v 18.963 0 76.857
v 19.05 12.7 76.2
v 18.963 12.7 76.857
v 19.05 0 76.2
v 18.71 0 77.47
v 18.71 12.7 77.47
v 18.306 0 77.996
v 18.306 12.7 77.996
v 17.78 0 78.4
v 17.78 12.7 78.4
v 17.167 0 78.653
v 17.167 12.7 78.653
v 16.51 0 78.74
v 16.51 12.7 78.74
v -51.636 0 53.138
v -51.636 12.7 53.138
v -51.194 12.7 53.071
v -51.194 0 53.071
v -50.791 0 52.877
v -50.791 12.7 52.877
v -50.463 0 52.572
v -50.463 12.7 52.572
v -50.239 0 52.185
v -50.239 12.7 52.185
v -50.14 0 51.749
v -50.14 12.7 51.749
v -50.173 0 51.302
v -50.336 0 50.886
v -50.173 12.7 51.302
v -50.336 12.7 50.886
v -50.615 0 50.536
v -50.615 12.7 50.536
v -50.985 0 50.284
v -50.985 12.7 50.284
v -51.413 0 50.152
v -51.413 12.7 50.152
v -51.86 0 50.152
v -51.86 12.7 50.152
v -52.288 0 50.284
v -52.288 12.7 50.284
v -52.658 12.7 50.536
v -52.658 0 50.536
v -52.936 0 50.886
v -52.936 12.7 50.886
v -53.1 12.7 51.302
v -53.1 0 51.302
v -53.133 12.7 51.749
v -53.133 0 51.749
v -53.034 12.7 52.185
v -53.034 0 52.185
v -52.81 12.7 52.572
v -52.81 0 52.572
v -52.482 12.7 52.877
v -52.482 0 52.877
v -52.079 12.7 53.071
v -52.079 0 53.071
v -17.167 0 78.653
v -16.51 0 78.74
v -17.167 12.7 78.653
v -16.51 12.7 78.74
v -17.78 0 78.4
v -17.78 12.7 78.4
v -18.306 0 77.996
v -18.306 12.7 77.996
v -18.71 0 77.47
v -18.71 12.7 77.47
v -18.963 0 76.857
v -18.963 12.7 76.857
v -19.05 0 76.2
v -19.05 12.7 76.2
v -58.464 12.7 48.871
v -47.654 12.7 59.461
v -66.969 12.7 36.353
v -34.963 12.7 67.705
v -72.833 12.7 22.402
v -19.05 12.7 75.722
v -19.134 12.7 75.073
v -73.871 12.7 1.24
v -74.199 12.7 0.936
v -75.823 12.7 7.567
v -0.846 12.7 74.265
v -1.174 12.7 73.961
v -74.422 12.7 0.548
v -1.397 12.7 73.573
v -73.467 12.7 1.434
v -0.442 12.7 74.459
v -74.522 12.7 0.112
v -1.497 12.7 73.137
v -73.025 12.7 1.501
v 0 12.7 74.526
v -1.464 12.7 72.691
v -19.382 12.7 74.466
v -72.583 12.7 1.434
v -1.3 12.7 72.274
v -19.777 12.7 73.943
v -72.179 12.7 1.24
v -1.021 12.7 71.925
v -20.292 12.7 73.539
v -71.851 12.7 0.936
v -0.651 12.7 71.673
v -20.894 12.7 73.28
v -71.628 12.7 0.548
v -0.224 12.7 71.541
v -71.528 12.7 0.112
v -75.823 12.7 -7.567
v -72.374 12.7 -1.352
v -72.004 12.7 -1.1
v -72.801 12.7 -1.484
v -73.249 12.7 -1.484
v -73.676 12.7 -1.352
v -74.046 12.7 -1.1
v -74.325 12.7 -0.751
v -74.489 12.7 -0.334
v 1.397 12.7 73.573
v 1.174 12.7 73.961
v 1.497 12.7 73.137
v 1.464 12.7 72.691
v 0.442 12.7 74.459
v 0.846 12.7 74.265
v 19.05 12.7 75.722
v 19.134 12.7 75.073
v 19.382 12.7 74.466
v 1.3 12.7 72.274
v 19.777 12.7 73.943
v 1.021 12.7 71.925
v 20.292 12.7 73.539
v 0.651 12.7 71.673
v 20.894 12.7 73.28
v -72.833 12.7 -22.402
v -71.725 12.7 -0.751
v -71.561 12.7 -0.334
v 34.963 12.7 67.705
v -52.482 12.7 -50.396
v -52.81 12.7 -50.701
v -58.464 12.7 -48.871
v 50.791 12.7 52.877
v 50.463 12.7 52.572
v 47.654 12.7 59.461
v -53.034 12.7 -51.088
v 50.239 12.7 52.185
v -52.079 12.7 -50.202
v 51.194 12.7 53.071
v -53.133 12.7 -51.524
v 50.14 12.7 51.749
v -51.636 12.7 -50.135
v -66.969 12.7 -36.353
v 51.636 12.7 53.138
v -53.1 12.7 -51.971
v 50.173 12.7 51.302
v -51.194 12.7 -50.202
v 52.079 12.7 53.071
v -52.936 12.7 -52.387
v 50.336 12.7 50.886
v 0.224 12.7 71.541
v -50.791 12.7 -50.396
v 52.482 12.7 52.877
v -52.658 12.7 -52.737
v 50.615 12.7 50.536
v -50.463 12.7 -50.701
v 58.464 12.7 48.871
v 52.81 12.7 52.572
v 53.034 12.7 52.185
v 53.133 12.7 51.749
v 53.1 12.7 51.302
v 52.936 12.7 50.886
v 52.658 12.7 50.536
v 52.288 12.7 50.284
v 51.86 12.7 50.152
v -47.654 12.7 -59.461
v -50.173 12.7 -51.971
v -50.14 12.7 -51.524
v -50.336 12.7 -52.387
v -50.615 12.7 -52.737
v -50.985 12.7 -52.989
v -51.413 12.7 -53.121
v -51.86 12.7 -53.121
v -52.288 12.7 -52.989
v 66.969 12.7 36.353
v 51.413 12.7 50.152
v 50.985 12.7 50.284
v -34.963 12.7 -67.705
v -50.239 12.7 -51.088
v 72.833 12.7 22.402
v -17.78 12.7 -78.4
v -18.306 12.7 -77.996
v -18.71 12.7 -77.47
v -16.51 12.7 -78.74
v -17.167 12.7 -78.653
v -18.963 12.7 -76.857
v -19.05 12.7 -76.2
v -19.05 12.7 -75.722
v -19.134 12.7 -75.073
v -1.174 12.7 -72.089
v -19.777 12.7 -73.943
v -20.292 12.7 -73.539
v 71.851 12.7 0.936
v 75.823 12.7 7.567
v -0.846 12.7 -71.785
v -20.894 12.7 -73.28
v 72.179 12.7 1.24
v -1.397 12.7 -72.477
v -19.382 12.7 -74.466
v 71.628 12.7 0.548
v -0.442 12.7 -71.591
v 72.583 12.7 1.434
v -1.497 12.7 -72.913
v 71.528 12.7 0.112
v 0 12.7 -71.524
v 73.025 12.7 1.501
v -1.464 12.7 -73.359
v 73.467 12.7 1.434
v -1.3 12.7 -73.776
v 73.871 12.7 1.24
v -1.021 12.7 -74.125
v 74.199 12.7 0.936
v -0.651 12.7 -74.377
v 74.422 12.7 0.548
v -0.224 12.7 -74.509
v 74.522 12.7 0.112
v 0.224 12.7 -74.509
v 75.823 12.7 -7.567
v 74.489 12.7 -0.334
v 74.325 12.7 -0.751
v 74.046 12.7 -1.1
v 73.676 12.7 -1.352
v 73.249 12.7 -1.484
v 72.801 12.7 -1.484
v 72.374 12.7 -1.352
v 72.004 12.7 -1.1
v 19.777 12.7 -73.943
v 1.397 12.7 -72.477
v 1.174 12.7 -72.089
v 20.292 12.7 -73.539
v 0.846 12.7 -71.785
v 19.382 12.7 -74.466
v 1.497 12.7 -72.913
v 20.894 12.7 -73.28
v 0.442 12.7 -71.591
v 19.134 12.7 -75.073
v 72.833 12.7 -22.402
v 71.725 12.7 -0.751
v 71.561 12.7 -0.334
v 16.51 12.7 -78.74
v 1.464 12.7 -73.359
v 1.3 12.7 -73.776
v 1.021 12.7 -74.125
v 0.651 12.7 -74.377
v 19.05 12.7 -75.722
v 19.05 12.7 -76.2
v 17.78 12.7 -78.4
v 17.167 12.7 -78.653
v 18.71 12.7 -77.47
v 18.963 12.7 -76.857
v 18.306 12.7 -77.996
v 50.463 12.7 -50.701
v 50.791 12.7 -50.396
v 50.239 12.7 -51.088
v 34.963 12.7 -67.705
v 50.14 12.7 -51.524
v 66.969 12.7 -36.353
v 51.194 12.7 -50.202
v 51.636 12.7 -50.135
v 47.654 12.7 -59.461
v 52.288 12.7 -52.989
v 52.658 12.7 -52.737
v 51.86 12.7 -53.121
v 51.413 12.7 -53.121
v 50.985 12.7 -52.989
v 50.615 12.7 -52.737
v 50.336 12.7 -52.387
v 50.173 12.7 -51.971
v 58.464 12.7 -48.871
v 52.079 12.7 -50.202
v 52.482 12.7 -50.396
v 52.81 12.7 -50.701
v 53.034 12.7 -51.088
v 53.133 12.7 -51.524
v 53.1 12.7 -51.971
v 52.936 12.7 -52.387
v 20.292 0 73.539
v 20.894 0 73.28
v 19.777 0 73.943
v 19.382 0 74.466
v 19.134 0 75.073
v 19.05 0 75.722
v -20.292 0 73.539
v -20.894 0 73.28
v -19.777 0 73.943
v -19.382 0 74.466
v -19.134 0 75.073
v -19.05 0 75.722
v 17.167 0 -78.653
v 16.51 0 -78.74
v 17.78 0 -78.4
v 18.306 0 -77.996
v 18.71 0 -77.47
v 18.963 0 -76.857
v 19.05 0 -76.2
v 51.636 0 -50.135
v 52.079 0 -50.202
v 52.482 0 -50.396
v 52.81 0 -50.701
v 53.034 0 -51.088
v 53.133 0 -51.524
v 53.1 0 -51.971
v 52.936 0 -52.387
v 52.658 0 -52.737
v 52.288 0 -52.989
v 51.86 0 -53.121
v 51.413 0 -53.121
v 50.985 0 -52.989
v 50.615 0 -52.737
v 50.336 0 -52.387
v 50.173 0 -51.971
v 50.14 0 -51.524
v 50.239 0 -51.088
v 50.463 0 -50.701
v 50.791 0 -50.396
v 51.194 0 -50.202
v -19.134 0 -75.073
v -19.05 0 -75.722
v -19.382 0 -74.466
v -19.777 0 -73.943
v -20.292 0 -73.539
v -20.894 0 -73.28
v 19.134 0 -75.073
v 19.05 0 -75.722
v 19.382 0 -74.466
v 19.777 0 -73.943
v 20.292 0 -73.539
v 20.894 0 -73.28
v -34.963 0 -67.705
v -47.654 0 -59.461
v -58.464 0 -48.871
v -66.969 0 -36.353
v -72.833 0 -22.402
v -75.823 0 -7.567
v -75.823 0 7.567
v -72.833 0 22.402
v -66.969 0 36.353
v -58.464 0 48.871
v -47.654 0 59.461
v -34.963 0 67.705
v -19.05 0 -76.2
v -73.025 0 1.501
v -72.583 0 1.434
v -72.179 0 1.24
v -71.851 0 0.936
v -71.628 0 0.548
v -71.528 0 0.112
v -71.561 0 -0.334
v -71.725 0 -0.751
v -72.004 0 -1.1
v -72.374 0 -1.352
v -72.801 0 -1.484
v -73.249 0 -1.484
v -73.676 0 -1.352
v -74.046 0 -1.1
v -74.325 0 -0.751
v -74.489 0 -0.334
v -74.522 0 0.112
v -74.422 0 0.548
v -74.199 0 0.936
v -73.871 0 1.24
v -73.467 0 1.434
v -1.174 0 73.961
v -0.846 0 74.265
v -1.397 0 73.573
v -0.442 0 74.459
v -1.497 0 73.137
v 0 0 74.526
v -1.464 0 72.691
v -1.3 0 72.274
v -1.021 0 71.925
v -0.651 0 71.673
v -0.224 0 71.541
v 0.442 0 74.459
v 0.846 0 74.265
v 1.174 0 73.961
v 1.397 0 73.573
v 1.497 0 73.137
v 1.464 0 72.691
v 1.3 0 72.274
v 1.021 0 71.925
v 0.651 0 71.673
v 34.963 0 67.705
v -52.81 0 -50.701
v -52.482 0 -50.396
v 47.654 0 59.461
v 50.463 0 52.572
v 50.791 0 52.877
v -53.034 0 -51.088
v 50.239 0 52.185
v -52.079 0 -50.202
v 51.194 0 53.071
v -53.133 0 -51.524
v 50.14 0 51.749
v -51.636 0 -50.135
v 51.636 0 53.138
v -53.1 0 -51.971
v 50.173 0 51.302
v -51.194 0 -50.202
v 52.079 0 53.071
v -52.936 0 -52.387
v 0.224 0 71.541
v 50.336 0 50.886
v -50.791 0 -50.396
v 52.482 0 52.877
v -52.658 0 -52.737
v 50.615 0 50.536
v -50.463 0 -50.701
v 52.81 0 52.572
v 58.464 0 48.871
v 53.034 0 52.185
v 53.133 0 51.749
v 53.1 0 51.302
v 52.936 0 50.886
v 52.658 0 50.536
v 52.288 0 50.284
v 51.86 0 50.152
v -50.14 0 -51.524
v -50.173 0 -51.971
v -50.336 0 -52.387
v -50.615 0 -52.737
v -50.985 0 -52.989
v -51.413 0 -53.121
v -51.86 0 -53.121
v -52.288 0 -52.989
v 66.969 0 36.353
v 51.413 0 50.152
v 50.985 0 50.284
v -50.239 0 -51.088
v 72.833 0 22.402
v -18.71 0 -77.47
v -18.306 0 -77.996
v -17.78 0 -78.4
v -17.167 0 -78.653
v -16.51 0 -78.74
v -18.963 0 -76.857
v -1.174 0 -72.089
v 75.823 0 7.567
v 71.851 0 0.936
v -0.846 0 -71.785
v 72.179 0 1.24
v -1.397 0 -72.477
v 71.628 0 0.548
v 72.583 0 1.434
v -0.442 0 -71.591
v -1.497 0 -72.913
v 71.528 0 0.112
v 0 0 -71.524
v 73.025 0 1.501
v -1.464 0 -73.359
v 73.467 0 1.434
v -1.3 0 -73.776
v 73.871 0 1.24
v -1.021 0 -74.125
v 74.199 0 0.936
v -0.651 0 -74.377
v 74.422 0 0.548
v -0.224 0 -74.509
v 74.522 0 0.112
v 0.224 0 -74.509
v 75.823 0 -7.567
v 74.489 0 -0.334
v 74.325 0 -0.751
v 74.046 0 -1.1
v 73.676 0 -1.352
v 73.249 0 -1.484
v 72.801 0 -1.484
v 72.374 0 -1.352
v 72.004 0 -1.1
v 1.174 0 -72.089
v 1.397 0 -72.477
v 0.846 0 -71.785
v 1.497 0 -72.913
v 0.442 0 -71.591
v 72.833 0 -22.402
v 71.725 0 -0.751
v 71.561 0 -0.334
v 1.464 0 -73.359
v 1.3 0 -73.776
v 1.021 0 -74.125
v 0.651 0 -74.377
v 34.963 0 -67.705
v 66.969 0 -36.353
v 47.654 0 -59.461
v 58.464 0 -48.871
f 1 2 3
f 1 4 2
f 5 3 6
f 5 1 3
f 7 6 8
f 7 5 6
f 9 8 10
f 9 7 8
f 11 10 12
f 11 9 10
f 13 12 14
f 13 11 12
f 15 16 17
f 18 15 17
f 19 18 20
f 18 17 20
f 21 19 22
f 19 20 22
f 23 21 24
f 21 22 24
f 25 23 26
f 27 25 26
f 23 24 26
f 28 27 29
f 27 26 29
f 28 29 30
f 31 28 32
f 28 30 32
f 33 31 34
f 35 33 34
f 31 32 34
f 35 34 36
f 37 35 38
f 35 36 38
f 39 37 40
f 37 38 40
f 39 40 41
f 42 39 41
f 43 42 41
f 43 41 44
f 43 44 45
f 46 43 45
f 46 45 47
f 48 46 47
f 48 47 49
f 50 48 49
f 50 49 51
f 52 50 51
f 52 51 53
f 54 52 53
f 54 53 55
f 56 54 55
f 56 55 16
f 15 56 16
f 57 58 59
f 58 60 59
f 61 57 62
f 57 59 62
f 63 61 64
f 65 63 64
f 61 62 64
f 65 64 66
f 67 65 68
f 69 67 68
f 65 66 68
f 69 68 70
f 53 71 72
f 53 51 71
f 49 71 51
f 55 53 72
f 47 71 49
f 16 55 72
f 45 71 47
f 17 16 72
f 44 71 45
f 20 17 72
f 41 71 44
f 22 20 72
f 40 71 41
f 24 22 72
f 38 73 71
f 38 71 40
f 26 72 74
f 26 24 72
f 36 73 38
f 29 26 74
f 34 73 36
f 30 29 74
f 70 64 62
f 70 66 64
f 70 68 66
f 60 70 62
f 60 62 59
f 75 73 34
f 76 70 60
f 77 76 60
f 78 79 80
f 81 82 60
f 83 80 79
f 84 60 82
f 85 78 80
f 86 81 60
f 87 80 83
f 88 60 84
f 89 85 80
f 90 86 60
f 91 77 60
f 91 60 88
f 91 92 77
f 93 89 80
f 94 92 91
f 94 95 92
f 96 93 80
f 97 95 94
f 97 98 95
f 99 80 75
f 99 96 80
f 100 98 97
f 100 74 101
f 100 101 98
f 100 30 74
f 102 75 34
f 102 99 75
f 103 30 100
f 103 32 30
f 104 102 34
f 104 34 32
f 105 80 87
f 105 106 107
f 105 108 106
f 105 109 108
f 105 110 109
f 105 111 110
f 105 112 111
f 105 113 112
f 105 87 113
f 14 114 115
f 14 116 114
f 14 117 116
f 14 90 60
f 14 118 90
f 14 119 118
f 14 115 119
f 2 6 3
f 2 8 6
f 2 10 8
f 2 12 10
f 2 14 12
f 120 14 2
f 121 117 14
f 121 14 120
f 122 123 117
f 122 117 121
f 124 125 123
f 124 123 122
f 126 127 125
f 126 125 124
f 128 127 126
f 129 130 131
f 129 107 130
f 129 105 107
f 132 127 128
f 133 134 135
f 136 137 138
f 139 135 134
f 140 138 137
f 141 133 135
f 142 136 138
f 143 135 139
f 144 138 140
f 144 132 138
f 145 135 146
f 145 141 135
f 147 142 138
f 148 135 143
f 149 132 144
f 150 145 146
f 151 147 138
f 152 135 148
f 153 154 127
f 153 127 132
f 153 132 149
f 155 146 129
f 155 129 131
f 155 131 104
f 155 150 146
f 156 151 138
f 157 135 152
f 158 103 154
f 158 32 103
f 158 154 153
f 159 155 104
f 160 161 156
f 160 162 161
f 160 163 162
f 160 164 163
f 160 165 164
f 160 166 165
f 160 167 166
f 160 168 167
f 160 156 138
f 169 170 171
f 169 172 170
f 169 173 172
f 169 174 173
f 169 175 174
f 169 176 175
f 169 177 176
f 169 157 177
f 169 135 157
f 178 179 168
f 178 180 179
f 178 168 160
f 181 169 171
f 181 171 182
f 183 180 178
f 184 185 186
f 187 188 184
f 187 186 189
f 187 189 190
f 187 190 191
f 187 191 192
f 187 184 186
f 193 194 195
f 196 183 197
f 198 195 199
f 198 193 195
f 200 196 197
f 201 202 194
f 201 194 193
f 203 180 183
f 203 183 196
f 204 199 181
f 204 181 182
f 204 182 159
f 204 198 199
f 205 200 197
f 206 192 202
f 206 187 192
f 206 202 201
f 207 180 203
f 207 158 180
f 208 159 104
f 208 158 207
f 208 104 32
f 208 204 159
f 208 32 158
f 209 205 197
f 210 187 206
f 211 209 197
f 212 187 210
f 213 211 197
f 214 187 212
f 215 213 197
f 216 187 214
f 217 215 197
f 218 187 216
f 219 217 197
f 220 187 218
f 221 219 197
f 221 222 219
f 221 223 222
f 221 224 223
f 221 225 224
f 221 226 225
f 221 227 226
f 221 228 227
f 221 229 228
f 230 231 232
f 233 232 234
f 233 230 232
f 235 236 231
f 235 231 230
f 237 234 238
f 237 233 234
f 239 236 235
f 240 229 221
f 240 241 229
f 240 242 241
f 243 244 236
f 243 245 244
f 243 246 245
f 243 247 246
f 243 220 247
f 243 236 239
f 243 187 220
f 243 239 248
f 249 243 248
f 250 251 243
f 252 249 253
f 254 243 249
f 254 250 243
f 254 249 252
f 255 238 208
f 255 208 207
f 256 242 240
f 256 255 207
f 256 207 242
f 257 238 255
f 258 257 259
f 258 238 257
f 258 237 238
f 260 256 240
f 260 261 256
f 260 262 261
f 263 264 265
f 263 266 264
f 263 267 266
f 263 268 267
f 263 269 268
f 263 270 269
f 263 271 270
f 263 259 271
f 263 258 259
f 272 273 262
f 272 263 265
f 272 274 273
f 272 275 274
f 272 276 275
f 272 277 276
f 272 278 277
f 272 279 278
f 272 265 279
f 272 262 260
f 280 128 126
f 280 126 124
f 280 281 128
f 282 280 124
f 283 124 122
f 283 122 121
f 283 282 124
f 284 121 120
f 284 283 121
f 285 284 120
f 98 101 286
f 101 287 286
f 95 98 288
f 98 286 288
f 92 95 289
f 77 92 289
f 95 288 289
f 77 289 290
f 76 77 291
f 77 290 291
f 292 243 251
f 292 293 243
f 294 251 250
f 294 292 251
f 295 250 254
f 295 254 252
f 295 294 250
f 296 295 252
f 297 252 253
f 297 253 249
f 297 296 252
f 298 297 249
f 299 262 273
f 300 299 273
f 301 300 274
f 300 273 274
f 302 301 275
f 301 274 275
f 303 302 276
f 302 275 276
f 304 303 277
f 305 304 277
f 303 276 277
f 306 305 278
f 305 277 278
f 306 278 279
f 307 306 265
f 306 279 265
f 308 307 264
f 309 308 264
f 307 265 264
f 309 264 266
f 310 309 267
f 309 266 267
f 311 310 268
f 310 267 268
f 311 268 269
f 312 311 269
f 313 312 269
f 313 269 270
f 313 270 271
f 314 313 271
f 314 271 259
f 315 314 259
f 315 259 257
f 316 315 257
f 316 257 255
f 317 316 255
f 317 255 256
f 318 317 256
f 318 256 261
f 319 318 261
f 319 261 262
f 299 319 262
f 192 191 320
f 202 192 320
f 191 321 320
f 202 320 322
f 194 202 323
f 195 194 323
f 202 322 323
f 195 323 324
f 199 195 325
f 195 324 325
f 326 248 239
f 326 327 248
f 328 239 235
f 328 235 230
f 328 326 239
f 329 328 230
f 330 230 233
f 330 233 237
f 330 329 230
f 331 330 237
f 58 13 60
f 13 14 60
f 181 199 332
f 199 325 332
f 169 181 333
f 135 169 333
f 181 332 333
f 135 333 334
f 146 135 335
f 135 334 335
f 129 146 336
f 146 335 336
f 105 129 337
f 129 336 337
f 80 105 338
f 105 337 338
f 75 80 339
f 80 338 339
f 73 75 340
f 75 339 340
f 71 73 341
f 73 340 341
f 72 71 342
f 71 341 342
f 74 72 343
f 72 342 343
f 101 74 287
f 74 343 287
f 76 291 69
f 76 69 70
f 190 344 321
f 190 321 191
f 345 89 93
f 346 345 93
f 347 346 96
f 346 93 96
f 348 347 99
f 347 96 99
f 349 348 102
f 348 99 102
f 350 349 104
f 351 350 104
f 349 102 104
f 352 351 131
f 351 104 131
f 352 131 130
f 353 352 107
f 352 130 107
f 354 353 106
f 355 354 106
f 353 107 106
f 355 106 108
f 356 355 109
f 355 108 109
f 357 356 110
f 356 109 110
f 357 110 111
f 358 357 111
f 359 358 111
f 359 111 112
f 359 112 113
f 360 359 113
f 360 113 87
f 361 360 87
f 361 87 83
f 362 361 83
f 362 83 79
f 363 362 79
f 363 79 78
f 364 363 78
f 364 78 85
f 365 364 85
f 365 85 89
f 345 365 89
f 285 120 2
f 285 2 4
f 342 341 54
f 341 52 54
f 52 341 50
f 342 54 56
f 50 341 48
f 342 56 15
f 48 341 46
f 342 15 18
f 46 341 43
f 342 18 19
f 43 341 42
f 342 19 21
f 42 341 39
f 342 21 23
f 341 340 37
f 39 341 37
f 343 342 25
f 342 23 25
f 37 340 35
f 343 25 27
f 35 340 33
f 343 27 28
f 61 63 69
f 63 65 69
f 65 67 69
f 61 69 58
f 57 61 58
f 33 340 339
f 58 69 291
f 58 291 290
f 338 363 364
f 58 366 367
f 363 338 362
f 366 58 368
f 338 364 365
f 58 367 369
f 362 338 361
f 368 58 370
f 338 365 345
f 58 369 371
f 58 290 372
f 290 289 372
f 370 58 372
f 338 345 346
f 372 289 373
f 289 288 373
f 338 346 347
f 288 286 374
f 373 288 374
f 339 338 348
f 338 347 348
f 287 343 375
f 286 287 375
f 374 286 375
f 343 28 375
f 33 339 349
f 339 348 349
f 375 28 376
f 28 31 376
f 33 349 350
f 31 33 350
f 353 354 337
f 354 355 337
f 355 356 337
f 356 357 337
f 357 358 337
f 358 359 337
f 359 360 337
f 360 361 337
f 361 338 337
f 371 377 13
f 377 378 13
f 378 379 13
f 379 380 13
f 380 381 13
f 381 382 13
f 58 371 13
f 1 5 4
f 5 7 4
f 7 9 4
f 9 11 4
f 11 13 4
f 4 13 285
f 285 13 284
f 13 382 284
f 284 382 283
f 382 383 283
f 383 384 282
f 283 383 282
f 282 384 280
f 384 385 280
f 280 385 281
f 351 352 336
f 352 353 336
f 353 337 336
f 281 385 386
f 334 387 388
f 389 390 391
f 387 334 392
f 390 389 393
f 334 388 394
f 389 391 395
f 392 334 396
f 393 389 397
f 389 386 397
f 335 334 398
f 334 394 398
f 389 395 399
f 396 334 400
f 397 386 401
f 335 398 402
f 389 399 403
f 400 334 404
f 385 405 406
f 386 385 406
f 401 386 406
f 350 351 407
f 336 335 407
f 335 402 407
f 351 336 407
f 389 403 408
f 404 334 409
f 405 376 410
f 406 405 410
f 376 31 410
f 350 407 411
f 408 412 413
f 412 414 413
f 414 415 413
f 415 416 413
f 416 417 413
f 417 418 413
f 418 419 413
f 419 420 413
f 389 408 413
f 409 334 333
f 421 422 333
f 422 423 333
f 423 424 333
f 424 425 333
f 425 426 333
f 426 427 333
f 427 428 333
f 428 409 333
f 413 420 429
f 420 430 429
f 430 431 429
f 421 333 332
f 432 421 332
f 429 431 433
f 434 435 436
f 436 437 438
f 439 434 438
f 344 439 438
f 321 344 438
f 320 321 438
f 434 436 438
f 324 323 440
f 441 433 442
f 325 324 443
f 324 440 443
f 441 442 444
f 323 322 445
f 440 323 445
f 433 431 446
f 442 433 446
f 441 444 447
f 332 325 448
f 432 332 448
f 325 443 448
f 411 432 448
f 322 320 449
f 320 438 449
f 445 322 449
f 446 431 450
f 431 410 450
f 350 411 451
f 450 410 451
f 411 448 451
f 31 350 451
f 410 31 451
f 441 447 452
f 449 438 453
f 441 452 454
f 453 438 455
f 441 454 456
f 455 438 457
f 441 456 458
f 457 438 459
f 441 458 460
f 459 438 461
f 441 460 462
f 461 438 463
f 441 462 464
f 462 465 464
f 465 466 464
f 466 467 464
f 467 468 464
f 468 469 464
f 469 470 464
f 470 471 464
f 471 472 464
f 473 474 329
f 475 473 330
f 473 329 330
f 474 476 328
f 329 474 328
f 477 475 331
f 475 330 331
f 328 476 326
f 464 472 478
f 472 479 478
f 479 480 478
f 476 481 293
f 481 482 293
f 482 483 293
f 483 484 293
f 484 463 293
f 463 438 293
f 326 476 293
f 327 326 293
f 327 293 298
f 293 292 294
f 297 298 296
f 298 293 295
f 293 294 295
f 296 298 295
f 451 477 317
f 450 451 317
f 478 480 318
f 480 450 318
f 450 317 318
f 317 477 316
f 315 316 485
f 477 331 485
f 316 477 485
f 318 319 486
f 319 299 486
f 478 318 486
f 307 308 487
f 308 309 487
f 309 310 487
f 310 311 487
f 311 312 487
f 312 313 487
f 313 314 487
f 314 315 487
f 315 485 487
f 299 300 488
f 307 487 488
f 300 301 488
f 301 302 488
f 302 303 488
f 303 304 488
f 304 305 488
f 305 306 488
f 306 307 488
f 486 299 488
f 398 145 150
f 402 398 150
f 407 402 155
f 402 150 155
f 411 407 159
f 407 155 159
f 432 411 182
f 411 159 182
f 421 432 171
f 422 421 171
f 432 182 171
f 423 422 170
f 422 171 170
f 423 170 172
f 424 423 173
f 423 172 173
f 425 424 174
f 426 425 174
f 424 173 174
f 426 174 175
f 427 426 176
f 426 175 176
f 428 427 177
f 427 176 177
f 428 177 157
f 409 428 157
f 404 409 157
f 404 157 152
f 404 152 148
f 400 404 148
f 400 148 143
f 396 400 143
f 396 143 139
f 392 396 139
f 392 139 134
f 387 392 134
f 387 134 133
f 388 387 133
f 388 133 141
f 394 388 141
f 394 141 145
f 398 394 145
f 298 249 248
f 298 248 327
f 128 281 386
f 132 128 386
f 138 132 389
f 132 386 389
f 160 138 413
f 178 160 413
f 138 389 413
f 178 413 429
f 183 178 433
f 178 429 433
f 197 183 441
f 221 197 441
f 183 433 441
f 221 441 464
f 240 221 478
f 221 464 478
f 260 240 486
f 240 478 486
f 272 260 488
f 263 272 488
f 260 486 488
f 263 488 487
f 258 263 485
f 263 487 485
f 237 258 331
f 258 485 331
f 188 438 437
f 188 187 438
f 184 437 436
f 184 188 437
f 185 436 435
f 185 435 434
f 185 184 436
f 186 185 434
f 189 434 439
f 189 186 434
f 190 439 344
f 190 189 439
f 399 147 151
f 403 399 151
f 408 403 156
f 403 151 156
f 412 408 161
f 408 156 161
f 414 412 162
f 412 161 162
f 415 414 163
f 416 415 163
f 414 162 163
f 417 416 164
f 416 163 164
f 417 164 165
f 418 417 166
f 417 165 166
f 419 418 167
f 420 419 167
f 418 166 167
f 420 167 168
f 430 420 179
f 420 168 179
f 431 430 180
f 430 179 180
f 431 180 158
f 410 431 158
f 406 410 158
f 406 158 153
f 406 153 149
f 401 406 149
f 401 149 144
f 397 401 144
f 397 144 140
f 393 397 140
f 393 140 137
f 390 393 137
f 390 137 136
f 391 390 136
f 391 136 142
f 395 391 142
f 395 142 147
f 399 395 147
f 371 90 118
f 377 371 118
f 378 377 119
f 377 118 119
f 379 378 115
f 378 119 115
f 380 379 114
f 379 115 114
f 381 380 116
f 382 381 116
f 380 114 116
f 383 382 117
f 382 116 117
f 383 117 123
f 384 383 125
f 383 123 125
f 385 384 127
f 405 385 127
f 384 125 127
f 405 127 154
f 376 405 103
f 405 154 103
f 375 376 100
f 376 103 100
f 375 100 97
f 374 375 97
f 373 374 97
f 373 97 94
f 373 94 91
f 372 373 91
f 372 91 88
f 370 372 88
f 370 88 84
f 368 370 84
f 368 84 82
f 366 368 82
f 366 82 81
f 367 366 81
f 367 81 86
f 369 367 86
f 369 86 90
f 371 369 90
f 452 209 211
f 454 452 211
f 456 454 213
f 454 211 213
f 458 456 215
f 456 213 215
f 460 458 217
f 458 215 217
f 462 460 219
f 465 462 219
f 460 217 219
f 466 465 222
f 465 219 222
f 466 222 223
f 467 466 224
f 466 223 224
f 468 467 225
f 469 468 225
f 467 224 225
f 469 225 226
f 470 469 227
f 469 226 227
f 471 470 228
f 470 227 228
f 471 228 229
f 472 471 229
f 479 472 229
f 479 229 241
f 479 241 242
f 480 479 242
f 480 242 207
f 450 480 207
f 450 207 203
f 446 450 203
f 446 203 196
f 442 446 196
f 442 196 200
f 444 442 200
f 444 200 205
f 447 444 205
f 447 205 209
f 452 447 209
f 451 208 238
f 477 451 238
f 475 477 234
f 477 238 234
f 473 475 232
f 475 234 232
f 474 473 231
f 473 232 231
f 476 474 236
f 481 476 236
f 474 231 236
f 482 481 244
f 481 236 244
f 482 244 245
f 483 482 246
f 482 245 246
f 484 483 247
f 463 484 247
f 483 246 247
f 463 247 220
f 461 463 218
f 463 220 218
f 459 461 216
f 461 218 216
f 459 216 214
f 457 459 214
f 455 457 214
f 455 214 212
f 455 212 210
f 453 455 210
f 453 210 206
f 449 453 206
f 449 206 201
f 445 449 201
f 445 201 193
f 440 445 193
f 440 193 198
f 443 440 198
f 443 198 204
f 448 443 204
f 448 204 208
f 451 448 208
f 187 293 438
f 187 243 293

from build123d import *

# Parameters (mm, degrees)
SKETCH2_R                = 76.2
BOSS_EXTRUDE1_DEPTH      = 12.7
BOSS_EXTRUDE2_DEPTH      = 78.74
BOSS_EXTRUDE2_DEPTH_BACK = 78.74
FILLET1_R                = 2.54
SKETCH4_R                = 1.50114
CUT_EXTRUDE1_DEPTH       = 111.307377813


with BuildPart() as part:
    # Sketch2 → Boss-Extrude1 (new body)
    with BuildSketch(Plane(origin=(0, 0, 0), x_dir=(1, 0, 0), z_dir=(0, 1, 0))):
        with Locations(Location((0, 0, 0), (0, 0, 270))):
            Circle(SKETCH2_R)
    extrude(amount=BOSS_EXTRUDE1_DEPTH)

    # Sketch3 → Boss-Extrude2 (add, two sides: drawn at the far end of the back side and taken through both)
    with BuildSketch(Plane.XY.offset(-BOSS_EXTRUDE2_DEPTH_BACK)):
        Polygon((0, 0), (-19.05, 0), (-19.05, 12.7), (19.05, 12.7), (19.05, 0), align=None)
    extrude(amount=BOSS_EXTRUDE2_DEPTH + BOSS_EXTRUDE2_DEPTH_BACK)

    # Fillet1
    fillet1_edges = [part.edges().sort_by_distance(p)[0] for p in [
        (-19.05, 6.35, -78.74),
        (19.05, 6.35, -78.74),
        (-19.05, 6.35, -73.780332745),
        (-19.05, 6.35, 73.780332745),
        (19.05, 6.35, 73.780332745),
        (19.05, 6.35, -73.780332745),
        (19.05, 6.35, 78.74),
        (-19.05, 6.35, 78.74),
    ]]
    fillet(fillet1_edges, radius=FILLET1_R)

    # Sketch4 → Cut-Extrude1 (cut, through all)
    with BuildSketch(Plane(origin=(0, 12.7, 0), x_dir=(1, 0, 0), z_dir=(0, 1, 0))):
        with Locations(Location((73.025, 0, 0), (0, 0, 270))):
            Circle(SKETCH4_R)
        with Locations(Location((51.636472696, -51.636472696, 0), (0, 0, 270))):
            Circle(SKETCH4_R)
        with Locations(Location((0, -73.025, 0), (0, 0, 270))):
            Circle(SKETCH4_R)
        with Locations(Location((-51.636472696, -51.636472696, 0), (0, 0, 270))):
            Circle(SKETCH4_R)
        with Locations(Location((-73.025, 0, 0), (0, 0, 270))):
            Circle(SKETCH4_R)
        with Locations(Location((-51.636472696, 51.636472696, 0), (0, 0, 270))):
            Circle(SKETCH4_R)
        with Locations(Location((0, 73.025, 0), (0, 0, 270))):
            Circle(SKETCH4_R)
        with Locations(Location((51.636472696, 51.636472696, 0), (0, 0, 270))):
            Circle(SKETCH4_R)
    extrude(amount=-CUT_EXTRUDE1_DEPTH, mode=Mode.SUBTRACT)


solid = part.part
